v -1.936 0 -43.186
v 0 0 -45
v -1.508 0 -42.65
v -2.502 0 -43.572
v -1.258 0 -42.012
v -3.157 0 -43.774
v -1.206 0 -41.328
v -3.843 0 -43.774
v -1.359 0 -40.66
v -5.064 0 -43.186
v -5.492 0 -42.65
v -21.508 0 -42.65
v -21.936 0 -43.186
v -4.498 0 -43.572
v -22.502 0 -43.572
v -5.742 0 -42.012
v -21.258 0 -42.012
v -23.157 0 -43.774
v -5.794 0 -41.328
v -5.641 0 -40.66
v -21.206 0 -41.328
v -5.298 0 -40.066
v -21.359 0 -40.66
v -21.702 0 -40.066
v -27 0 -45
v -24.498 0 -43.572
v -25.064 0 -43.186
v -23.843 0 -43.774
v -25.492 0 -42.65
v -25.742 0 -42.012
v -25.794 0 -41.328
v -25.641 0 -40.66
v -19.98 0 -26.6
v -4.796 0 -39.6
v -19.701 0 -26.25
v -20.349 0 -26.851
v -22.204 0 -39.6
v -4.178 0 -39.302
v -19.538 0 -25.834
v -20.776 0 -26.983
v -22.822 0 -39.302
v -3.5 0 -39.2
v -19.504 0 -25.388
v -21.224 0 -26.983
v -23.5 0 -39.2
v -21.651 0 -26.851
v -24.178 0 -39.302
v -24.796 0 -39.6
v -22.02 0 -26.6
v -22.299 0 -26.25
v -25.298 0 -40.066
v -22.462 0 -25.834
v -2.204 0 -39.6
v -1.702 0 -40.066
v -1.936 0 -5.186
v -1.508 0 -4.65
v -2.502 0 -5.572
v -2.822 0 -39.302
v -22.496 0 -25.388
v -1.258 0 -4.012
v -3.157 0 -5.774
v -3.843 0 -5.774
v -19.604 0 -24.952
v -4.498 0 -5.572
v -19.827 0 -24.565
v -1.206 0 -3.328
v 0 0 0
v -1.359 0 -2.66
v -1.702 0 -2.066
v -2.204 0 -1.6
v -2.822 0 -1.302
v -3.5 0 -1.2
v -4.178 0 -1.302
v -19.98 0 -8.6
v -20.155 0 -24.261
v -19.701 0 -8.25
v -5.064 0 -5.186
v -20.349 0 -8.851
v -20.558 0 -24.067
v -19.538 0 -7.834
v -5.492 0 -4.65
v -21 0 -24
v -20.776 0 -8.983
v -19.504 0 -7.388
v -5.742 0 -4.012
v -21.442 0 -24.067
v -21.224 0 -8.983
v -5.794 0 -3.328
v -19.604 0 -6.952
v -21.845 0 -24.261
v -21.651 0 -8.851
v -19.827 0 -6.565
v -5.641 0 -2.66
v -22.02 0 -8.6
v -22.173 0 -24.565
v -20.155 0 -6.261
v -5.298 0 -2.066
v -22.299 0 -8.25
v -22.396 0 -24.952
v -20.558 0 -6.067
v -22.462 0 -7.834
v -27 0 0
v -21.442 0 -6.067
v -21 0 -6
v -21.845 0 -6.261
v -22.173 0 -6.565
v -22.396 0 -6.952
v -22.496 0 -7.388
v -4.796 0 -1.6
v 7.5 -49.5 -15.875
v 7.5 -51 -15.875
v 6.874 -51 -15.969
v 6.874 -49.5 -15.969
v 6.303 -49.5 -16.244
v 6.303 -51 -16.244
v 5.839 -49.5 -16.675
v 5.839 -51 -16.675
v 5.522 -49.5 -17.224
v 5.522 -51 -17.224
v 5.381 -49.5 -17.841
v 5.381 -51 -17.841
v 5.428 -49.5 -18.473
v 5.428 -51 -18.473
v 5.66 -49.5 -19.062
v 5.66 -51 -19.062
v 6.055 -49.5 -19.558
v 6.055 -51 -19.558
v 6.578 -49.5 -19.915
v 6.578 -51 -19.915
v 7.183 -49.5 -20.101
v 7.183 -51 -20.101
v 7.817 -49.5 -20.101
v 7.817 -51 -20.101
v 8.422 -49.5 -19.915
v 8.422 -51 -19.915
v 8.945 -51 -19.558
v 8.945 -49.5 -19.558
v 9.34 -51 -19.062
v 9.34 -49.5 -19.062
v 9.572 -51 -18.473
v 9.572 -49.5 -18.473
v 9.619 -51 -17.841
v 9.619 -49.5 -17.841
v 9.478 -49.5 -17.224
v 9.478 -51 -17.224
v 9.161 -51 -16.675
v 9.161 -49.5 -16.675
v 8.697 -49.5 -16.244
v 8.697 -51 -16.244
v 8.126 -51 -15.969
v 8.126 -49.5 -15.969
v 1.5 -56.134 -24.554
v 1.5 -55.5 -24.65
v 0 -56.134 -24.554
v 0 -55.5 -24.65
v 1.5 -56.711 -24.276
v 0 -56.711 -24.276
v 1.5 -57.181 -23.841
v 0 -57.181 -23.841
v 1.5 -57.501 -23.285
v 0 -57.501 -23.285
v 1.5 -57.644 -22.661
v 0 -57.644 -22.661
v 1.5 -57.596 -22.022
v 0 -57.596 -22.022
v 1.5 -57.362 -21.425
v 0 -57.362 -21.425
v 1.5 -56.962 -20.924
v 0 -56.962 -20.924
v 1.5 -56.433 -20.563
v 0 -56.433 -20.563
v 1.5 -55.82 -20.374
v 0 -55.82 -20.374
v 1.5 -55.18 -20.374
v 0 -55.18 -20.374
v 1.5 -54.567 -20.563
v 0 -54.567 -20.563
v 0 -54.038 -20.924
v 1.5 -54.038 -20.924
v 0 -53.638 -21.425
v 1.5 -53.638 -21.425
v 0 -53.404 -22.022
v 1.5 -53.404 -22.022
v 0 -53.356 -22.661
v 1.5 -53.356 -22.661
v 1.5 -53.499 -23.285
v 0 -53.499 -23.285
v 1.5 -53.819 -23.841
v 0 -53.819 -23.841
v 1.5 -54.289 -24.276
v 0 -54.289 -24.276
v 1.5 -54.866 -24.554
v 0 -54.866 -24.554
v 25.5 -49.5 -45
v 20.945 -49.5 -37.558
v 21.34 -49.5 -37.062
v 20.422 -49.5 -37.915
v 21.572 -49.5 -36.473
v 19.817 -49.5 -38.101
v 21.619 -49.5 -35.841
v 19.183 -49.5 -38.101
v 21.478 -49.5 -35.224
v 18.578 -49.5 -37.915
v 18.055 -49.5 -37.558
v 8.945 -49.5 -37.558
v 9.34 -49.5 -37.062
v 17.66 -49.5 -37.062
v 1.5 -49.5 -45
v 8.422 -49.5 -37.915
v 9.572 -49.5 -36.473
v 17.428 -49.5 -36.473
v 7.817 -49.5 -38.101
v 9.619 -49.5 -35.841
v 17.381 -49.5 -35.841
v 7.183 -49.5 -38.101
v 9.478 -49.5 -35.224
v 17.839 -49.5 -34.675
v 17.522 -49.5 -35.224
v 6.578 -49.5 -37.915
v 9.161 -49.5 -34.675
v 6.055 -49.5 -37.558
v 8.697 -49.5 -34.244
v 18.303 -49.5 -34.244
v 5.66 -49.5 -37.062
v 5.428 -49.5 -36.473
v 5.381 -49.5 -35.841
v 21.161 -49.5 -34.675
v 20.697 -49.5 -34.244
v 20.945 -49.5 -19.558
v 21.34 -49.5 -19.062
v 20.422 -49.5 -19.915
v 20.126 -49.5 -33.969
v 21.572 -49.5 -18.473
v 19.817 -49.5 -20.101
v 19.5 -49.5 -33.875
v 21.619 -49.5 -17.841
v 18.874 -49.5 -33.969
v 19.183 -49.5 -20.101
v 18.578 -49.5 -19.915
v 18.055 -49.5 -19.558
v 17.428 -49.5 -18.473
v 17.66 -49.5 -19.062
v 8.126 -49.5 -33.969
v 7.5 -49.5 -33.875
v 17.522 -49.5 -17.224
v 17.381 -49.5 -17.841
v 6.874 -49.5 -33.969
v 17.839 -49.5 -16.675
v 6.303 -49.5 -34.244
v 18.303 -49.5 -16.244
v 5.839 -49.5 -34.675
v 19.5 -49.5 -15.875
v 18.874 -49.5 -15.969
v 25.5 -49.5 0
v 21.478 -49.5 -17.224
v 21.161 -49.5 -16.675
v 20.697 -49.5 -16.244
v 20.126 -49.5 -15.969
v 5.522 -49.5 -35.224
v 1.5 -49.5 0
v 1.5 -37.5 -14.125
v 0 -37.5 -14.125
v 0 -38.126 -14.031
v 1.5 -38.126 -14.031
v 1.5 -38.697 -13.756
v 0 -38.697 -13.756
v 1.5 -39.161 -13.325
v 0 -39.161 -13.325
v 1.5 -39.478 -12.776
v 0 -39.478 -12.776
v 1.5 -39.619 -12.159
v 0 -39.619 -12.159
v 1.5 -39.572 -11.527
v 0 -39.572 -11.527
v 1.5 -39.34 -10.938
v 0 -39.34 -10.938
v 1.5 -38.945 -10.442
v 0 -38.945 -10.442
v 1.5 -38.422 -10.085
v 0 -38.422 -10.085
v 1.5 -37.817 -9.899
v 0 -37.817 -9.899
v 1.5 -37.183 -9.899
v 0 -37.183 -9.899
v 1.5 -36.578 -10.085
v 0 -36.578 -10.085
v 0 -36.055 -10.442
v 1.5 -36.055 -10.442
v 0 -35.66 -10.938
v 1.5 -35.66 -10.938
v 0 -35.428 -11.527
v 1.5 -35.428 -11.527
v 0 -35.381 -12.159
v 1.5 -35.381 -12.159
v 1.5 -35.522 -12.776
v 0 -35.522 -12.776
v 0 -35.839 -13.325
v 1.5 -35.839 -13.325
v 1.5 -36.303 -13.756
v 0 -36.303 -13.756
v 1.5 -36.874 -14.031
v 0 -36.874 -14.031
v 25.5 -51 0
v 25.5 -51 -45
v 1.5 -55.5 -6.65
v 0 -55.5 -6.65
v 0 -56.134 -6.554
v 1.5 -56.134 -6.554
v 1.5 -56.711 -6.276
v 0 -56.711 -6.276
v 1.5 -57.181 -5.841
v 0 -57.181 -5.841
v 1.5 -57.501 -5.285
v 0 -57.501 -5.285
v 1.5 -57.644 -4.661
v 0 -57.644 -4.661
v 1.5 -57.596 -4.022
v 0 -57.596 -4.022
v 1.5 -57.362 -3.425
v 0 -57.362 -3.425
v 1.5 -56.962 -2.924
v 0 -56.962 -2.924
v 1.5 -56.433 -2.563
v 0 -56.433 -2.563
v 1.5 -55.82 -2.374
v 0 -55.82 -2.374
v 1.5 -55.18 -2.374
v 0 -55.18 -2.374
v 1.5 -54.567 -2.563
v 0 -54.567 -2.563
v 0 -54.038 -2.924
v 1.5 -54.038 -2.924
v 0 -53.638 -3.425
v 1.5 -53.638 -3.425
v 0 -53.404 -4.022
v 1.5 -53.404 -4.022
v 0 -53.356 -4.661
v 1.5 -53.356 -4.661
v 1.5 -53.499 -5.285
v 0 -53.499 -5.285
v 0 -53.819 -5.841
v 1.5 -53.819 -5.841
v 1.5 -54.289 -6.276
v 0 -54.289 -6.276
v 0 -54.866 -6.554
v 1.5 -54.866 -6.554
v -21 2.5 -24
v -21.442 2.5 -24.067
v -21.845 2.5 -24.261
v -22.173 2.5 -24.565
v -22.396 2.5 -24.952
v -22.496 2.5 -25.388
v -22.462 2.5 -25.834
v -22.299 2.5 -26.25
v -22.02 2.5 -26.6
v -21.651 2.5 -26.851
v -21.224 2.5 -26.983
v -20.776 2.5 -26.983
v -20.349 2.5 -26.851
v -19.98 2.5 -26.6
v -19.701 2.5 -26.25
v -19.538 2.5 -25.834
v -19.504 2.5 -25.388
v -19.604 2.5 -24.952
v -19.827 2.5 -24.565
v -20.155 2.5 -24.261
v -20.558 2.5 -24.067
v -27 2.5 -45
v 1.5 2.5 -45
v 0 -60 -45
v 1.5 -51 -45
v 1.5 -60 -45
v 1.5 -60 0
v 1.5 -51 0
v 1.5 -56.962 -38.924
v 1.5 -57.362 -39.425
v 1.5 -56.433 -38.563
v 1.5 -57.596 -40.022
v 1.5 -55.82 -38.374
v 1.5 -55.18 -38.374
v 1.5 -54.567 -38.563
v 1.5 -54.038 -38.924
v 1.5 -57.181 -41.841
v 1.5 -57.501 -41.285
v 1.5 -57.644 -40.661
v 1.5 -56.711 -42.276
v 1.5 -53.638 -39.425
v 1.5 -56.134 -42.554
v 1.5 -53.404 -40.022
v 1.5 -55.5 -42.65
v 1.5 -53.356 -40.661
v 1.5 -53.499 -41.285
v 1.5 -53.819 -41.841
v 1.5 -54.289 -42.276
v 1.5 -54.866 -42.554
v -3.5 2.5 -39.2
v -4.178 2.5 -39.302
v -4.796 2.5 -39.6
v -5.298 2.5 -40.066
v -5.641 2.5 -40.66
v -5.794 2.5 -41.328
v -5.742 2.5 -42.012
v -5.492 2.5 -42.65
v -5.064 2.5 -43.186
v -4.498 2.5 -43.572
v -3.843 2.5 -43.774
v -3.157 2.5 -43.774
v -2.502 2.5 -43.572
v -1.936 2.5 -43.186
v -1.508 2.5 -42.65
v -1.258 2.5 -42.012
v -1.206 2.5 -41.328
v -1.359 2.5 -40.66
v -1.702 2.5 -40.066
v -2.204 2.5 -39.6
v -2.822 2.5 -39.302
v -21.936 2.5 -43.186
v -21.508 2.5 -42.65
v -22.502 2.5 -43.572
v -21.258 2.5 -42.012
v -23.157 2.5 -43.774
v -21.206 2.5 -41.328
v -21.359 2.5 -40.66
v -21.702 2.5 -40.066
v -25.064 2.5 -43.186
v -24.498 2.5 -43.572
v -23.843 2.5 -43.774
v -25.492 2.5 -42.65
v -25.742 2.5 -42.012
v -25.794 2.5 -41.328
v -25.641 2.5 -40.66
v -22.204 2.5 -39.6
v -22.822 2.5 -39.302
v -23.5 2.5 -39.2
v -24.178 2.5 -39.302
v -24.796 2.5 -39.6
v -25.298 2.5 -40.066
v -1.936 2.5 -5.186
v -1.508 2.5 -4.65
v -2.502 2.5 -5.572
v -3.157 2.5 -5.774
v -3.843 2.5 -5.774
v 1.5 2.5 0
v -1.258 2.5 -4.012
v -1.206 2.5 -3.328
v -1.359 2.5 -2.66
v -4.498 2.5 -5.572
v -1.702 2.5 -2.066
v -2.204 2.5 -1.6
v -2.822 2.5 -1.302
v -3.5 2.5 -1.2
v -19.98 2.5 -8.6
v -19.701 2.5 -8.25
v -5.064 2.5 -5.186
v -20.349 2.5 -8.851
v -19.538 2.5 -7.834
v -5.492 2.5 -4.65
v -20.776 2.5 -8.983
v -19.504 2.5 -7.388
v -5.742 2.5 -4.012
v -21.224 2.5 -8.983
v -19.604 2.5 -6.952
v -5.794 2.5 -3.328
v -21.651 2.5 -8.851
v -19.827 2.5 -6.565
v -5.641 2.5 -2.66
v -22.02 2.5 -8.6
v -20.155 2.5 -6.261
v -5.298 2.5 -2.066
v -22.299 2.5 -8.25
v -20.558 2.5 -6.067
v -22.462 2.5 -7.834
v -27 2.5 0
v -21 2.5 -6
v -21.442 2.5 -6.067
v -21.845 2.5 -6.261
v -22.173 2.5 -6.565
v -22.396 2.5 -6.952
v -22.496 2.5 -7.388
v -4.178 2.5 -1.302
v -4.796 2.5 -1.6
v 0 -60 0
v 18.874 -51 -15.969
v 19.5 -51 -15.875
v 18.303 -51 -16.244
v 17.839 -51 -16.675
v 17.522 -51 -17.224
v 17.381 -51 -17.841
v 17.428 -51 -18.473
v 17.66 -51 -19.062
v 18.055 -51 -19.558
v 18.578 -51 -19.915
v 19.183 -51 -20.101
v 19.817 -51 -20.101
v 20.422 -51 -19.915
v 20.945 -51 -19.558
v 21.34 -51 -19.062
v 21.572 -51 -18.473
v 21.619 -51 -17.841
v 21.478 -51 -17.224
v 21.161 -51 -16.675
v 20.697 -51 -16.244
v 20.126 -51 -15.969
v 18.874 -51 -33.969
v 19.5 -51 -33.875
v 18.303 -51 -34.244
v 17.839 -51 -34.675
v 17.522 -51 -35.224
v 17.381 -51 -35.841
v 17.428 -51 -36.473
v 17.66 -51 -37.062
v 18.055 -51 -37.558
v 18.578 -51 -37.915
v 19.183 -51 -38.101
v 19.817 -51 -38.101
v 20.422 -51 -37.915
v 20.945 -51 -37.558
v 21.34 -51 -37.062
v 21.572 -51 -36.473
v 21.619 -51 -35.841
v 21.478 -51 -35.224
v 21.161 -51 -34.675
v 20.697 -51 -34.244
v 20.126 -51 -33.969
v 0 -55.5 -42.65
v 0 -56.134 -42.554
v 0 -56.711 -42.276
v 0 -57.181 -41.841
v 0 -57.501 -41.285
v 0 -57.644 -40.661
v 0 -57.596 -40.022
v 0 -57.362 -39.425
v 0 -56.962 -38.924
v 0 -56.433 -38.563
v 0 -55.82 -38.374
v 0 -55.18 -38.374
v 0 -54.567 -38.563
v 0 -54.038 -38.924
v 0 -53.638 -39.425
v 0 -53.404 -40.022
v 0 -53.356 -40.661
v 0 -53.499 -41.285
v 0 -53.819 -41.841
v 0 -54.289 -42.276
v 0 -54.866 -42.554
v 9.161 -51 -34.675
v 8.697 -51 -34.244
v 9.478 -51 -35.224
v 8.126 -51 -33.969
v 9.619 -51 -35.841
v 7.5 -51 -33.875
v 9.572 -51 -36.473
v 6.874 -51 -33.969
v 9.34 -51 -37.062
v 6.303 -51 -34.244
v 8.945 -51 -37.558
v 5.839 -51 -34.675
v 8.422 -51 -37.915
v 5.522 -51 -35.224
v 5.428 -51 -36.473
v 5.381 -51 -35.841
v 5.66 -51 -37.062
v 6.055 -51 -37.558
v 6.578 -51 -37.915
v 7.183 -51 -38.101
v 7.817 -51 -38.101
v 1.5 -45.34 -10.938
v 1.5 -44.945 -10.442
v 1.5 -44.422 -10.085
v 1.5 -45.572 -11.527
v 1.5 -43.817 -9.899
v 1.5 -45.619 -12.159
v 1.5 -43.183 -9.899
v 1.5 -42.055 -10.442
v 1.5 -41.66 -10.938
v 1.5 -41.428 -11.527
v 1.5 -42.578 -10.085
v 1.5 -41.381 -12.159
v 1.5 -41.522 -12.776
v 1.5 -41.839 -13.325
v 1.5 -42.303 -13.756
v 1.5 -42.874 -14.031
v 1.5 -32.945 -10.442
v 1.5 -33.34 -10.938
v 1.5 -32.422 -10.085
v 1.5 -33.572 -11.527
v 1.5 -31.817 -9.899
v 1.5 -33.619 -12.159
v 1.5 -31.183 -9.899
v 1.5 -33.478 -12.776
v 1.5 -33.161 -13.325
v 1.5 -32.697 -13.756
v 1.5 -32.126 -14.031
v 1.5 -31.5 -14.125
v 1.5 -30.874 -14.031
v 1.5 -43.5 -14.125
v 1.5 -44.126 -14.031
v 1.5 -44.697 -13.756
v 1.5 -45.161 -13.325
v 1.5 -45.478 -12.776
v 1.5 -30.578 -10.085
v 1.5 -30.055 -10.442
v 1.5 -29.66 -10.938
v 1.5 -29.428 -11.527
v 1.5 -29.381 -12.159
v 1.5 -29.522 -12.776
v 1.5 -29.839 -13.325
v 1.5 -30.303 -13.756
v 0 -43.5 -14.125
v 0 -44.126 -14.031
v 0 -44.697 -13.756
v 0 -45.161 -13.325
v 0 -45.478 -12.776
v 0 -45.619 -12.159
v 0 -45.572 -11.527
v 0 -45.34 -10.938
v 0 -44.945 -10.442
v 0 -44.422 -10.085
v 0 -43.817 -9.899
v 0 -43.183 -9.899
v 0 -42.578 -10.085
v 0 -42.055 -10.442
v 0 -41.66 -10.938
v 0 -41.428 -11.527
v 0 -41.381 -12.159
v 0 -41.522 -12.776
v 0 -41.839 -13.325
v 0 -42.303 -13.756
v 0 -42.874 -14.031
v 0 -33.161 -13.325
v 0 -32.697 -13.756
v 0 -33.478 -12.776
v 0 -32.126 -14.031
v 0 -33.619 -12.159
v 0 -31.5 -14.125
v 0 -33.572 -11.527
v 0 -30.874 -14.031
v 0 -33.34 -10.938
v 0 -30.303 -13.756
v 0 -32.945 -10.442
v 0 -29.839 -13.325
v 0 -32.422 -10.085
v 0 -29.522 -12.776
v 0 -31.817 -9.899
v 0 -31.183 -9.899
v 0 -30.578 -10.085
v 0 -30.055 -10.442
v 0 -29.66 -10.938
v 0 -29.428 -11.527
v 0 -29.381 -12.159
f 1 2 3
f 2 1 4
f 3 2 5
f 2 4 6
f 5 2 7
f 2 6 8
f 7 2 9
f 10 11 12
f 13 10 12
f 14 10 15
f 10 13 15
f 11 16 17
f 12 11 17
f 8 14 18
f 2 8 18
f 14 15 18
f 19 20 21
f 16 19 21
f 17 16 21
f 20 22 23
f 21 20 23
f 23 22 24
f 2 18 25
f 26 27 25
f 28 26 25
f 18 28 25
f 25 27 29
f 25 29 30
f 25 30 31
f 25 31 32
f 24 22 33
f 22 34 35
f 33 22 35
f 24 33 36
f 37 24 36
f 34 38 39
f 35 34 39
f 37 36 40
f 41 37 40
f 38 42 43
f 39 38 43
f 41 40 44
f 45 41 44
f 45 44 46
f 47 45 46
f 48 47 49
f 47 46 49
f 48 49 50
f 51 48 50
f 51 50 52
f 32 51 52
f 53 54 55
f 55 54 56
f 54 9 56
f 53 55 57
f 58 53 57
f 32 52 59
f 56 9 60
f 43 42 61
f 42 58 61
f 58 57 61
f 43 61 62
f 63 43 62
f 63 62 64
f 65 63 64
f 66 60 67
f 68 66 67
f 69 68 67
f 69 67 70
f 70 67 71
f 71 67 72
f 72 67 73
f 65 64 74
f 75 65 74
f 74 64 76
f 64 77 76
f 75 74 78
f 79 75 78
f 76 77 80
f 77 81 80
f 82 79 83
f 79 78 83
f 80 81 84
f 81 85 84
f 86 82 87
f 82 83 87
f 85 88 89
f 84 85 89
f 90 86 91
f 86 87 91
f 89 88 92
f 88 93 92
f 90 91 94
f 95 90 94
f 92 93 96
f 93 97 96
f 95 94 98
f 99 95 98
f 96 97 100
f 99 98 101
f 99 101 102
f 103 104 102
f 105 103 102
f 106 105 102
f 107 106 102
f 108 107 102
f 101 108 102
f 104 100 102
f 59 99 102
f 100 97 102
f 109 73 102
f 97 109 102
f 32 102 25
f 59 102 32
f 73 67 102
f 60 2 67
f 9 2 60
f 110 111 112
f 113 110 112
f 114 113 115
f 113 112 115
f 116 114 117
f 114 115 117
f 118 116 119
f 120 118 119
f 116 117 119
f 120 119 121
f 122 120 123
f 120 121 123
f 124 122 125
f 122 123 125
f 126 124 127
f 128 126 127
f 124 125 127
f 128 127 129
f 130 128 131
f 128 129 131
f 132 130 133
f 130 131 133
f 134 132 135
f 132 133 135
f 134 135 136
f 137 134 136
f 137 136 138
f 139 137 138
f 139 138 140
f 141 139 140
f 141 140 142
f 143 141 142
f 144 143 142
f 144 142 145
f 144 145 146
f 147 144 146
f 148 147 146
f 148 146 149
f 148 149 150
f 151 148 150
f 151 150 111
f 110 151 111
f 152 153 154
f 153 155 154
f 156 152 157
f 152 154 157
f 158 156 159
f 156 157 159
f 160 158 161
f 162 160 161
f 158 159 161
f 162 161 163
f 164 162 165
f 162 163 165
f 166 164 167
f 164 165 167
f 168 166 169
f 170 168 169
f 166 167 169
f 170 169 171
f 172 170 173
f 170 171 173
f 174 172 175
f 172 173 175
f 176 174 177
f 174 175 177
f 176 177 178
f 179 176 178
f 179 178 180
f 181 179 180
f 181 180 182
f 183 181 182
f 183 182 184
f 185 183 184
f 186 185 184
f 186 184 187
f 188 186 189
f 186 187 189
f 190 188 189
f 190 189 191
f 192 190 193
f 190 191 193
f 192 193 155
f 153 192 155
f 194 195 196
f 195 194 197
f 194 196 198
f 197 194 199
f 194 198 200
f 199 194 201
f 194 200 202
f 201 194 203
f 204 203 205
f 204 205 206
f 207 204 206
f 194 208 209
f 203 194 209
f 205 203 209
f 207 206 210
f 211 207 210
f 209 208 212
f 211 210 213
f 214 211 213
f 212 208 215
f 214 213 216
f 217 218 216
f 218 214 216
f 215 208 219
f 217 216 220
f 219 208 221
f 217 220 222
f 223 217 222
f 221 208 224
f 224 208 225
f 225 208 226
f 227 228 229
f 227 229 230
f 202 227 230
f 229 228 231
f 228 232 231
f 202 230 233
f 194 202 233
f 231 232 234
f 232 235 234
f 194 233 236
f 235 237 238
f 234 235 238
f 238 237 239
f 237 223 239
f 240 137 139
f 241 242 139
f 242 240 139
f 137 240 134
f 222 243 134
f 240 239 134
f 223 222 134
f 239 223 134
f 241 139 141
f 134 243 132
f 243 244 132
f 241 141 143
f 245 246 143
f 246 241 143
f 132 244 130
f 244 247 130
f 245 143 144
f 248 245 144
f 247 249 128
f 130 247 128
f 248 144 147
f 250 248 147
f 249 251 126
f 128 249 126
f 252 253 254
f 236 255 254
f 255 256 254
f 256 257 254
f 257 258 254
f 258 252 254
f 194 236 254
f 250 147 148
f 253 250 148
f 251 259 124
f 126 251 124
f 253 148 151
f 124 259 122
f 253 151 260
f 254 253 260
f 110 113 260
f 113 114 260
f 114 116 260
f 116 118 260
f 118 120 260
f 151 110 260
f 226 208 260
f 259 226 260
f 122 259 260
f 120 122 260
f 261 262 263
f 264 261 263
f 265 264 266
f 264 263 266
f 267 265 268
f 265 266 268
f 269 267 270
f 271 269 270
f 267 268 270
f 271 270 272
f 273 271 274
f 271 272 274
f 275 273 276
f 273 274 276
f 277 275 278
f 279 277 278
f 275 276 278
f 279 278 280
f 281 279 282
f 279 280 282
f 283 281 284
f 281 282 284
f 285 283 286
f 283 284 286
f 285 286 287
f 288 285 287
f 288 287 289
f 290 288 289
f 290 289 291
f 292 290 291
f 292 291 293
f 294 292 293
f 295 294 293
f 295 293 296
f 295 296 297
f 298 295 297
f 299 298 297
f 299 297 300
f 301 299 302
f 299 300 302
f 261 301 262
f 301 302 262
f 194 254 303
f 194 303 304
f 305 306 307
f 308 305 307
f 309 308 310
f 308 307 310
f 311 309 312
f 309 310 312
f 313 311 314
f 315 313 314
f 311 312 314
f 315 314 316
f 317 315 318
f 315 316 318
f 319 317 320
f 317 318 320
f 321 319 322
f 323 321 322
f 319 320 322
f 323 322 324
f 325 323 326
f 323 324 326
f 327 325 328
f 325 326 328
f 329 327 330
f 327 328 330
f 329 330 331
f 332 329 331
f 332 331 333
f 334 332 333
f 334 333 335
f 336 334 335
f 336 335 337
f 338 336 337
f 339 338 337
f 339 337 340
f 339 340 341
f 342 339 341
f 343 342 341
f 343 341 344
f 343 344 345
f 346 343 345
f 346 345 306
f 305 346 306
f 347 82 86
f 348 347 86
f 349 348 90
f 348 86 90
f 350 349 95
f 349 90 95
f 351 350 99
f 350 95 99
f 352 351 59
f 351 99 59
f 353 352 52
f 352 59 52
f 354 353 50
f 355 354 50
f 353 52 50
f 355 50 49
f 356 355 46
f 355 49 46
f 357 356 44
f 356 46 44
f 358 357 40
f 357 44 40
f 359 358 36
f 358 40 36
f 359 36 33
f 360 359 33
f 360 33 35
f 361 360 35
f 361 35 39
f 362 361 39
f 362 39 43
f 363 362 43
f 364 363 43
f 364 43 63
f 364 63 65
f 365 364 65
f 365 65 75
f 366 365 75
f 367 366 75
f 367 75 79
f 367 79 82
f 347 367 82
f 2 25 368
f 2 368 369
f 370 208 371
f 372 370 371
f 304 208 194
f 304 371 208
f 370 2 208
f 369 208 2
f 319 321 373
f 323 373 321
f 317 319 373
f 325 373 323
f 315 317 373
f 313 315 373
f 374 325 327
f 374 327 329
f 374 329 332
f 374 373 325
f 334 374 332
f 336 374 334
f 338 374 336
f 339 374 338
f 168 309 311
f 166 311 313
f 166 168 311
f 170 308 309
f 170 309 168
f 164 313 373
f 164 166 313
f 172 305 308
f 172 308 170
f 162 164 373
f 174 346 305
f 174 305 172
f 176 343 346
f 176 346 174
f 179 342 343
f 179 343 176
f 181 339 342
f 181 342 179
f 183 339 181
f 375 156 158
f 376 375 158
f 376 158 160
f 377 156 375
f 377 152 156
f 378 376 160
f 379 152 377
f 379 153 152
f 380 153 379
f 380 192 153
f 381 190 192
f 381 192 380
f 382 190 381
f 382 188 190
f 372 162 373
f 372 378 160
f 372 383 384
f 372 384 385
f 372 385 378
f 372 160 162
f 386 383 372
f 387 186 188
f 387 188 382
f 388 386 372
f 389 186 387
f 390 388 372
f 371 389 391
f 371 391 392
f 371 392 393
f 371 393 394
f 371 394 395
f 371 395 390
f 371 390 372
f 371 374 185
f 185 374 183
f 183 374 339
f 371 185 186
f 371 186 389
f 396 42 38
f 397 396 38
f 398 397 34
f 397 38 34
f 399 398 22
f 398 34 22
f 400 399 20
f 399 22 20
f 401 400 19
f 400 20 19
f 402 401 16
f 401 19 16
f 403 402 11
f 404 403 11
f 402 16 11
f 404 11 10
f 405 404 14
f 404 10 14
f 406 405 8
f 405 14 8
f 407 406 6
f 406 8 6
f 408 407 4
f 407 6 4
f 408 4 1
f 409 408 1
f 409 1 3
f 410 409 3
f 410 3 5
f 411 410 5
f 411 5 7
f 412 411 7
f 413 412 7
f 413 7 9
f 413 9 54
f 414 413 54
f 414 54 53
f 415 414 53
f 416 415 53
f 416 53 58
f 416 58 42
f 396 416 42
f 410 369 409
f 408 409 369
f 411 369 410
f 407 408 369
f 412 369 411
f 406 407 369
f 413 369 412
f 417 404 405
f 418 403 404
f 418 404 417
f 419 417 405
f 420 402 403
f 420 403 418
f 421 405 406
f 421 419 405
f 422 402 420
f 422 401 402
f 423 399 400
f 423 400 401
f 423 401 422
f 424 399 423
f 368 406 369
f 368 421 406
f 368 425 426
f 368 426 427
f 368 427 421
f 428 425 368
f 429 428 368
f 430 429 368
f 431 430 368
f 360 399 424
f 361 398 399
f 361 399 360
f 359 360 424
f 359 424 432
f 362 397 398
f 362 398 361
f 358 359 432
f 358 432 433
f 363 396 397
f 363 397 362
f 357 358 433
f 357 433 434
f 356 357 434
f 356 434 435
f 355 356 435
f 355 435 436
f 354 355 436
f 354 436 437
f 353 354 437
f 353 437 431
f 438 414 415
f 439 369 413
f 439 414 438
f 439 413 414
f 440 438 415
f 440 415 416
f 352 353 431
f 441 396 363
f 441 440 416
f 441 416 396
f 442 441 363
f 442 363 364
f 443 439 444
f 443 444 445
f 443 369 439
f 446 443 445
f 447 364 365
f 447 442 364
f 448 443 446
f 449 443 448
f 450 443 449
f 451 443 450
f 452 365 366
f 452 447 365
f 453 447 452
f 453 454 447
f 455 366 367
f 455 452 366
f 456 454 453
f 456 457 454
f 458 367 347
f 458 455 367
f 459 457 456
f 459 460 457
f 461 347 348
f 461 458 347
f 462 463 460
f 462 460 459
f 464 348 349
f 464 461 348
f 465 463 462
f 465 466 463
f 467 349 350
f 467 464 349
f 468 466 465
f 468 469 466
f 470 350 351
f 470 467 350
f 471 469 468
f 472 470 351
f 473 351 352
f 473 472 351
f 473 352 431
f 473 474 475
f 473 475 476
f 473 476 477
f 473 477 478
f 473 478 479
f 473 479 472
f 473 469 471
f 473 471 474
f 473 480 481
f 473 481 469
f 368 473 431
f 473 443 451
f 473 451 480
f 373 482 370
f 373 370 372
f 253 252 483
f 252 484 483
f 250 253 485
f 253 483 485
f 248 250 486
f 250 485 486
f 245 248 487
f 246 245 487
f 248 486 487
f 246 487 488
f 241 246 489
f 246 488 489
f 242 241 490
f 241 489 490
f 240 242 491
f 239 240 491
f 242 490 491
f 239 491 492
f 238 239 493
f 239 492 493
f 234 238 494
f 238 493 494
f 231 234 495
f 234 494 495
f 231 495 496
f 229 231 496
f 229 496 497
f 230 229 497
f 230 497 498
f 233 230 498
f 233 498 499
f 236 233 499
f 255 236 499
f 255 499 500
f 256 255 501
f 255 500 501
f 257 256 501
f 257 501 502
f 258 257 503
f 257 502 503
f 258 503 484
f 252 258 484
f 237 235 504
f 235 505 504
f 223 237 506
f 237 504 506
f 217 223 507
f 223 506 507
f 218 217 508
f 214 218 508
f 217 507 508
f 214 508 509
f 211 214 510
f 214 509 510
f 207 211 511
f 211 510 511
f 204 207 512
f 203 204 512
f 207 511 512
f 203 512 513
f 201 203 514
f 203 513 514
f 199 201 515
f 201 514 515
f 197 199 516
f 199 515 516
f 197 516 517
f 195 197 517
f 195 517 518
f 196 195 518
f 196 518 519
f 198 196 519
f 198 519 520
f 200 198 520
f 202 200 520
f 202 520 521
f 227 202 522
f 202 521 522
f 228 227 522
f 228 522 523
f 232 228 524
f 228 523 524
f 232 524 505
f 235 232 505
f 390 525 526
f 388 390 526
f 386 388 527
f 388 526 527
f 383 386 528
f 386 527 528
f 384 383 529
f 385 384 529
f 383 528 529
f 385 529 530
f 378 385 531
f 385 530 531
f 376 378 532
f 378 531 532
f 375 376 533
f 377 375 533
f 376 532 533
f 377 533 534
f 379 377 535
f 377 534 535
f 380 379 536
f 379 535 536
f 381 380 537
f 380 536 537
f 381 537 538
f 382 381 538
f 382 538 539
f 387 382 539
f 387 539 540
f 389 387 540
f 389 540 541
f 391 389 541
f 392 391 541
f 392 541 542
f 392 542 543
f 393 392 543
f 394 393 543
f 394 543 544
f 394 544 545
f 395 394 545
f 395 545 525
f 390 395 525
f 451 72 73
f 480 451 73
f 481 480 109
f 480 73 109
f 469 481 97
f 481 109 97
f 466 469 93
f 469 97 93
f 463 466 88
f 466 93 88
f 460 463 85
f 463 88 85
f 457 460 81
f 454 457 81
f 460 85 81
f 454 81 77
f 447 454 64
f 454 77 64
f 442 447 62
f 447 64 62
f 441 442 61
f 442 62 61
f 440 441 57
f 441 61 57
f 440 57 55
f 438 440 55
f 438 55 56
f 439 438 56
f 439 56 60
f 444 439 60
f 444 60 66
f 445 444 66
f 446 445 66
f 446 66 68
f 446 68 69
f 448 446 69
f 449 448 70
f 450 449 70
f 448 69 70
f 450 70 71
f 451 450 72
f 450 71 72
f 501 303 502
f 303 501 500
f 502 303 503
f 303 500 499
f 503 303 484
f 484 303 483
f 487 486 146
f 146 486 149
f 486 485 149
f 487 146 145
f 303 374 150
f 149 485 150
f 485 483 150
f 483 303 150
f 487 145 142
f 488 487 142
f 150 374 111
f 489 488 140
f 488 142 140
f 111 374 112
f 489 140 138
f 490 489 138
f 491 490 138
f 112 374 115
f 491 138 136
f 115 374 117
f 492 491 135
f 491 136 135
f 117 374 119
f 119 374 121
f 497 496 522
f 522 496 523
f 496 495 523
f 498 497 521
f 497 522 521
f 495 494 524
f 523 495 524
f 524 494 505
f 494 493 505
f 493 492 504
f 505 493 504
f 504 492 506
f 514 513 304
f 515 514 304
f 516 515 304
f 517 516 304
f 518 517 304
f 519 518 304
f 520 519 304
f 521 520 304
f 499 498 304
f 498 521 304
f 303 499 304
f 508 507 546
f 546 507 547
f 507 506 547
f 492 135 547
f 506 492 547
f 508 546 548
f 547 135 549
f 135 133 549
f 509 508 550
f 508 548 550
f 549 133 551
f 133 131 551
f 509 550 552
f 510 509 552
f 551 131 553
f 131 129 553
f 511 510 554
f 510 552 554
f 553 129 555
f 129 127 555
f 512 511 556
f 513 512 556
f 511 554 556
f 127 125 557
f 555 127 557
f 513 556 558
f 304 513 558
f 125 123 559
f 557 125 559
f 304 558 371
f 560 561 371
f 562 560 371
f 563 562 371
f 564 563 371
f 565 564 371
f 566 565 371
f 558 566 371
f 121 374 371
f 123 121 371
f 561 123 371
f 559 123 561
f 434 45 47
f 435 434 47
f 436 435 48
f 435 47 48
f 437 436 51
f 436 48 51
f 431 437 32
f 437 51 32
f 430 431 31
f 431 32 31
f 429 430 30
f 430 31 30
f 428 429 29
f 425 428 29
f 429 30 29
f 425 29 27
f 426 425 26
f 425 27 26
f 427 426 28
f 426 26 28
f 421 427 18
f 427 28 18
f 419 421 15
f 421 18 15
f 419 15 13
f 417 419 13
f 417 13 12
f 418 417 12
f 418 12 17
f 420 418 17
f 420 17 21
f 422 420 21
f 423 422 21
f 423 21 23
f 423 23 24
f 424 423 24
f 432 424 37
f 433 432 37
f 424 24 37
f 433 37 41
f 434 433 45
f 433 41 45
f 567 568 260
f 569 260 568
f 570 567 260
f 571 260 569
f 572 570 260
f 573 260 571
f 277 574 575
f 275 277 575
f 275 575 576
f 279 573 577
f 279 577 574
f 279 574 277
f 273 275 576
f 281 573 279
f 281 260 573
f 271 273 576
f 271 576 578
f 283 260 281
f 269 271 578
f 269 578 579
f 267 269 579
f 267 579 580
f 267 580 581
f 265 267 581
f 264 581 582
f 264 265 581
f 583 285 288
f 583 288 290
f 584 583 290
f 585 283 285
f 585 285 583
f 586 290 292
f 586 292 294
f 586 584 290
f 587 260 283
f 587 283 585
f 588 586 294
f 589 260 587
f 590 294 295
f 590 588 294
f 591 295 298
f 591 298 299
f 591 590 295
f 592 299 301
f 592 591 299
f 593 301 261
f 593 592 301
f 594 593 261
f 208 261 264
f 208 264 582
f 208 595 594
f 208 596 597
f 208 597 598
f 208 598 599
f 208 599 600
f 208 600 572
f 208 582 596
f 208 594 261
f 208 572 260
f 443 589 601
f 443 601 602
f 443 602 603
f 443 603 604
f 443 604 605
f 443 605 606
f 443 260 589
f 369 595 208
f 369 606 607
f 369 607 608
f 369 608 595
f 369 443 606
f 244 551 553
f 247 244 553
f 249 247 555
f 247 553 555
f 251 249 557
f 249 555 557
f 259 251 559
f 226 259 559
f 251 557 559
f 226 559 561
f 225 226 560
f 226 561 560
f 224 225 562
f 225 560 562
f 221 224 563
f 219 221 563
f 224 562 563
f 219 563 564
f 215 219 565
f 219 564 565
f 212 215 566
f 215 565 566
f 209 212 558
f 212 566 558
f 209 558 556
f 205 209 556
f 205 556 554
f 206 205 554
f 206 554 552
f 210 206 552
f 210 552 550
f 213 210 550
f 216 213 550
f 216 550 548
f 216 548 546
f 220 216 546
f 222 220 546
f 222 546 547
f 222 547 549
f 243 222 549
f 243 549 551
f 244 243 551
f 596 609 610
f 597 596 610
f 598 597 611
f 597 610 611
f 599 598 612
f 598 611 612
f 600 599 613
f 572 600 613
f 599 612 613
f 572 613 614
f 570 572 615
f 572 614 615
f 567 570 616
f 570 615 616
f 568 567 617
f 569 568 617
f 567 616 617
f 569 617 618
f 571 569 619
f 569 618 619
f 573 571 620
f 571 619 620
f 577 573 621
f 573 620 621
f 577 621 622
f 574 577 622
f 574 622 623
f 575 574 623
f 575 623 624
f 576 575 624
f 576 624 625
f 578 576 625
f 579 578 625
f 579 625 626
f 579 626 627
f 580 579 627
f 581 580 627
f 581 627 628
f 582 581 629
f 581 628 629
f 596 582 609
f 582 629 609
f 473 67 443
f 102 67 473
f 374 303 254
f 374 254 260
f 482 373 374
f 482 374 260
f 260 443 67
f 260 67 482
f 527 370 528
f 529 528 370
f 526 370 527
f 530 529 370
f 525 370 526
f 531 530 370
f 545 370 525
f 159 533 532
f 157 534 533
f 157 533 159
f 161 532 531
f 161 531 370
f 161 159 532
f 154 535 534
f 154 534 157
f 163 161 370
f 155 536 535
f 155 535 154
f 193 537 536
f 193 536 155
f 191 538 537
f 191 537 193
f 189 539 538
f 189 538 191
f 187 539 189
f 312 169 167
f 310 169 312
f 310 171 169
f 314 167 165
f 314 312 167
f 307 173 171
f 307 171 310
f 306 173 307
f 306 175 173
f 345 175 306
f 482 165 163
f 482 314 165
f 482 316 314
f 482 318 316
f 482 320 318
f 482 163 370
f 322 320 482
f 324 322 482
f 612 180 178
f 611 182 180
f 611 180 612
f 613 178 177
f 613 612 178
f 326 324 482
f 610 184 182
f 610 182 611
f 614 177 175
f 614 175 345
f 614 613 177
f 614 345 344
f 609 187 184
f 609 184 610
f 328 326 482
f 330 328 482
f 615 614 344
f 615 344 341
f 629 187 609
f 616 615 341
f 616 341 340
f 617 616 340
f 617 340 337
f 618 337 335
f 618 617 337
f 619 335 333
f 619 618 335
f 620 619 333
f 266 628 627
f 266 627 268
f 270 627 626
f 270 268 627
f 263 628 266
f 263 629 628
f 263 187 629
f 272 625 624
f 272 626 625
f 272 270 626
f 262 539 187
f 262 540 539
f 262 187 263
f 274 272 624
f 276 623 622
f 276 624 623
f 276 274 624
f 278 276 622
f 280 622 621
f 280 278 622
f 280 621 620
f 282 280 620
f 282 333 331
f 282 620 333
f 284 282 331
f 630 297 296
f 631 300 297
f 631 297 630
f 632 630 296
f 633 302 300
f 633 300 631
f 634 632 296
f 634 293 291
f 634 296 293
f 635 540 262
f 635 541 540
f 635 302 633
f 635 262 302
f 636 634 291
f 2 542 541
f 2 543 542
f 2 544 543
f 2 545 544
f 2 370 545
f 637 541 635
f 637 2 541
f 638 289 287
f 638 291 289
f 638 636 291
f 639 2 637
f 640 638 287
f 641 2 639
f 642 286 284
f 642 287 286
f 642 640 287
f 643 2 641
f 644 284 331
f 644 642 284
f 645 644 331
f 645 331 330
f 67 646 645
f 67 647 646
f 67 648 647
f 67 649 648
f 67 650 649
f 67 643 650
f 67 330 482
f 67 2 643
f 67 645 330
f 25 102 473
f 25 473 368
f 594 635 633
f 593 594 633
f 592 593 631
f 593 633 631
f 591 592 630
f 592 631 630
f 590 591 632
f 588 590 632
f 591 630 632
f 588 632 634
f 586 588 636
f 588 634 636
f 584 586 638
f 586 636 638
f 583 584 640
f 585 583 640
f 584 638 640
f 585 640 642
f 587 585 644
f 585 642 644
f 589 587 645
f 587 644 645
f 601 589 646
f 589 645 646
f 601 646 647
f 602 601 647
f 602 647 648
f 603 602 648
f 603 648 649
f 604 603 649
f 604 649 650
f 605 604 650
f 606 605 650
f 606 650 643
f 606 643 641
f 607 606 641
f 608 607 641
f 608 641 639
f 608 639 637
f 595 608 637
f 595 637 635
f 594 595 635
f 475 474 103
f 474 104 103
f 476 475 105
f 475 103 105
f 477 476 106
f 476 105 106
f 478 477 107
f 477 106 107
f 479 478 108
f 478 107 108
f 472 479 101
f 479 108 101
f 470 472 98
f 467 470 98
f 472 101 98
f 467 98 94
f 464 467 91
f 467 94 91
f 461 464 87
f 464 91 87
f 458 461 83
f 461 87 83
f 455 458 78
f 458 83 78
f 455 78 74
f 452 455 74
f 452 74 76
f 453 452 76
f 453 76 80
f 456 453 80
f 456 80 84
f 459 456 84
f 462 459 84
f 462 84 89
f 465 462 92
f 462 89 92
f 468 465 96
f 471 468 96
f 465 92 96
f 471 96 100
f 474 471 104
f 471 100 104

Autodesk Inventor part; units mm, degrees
ref_plane "YZ Plane" through (0, 0, 0) normal (1, 0, 0) x (0, 1, 0)
ref_plane "XZ Plane" through (0, 0, 0) normal (0, 1, 0) x (-1, 0, 0)
ref_plane "XY Plane" through (0, 0, 0) normal (0, 0, 1) x (1, 0, 0)
sketch "Sketch3" plane through (0, 0, 0) normal (0, 1, 0) x (-1, 0, 0)
  line L0 (0, 0) -> (27, 0)
  line L1 (27, 0) -> (27, -45)
  line L2 (27, -45) -> (0, -45)
  line L3 (0, -45) -> (0, 0)
  dimension "d27" = 27
  dimension "d28" = 45
extrude "Extrusion2" add sketch "Sketch3" along normal blind 2.5
sketch "Sketch4" plane through (0, 0, 0) normal (0, -1, 0) x (1, 0, 0)
  line L0 (0, 0) -> (1.5, 0)
  line L1 (1.5, 0) -> (1.5, -45)
  line L2 (1.5, -45) -> (0, -45)
  line L3 (0, -45) -> (0, 0)
  dimension "d31" = 1.5
  dimension "d32" = 45
extrude "Extrusion3" add sketch "Sketch4" along normal blind 60 and the other way blind 2.5
sketch "Sketch5" plane through (0, 2.5, 0) normal (0, 1, 0) x (1, 0, 0)
  line L0 (-27, 0) -> (-27, 45) projected
  line L1 (-27, 0) -> (1.5, 0) projected
  circle A0 centre (-3.5, 3.5) radius 2.3
  line L2 (0, 45) -> (0, 0) projected
  circle A1 centre (-23.5, 41.5) radius 2.3
  line L3 (1.5, 45) -> (-27, 45) projected
  circle A2 centre (-3.5, 41.5) radius 2.3
  dimension "d45" = 4.6
  dimension "d46" = 3.5
  dimension "d47" = 3.5
  dimension "d50" = 4.6
  dimension "d51" = 3.5
  dimension "d52" = 4.6
  dimension "d61" = 3.5
  dimension "d62" = 3.5
  dimension "d63" = 3.5
hole "Hole2" at (-3.5, 2.5, -3.5) at (-3.5, 2.5, -41.5) at (-23.5, 2.5, -41.5) direction (0, -1, 0) diameter 4.6 end through all
sketch "Sketch6" plane through (0, 2.5, 0) normal (0, 1, 0) x (1, 0, 0)
  circle A0 centre (-21, 7.5) radius 1.5
  line L0 (-27, 45) -> (-27, 0) projected
  line L1 (-27, 0) -> (1.5, 0) projected
  circle A1 centre (-21, 25.5) radius 1.5
  point P0 (0, 0)
  dimension "d64" = 3
  dimension "d65" = 6
  dimension "d66" = 7.5
  dimension "d67" = 3
  dimension "d68" = 18
hole "Hole3" at (-21, 2.5, -7.5) at (-21, 2.5, -25.5) direction (0, -1, 0) diameter 3 end through all
sketch "Sketch7" plane through (1.5, -60, 0) normal (1, 0, 0) x (0, 0, -1)
  circle A0 centre (4.5, 4.5) radius 2.15
  line L0 (45, 0) -> (0, 0) projected
  line L1 (0, 0) -> (0, 62.5) projected
  circle A1 centre (40.5, 4.5) radius 2.15
  line L2 (45, 0) -> (45, 62.5) projected
  circle A2 centre (22.5, 4.5) radius 2.15
  point P0 (0, 60)
  dimension "d76" = 4.3
  dimension "d77" = 4.5
  dimension "d78" = 4.5
  dimension "d79" = 4.3
  dimension "d80" = 4.5
  dimension "d81" = 4.5
  dimension "d82" = 4.3
hole "Hole4" at (1.5, -55.5, -4.5) at (1.5, -55.5, -22.5) at (1.5, -55.5, -40.5) direction (-1, 0, 0) diameter 4.3 end through all
sketch "Sketch8" plane through (1.5, -60, 0) normal (1, 0, 0) x (0, 0, -1)
  line L0 (0, 9) -> (45, 9)
  line L1 (45, 9) -> (45, 10.5)
  line L2 (45, 10.5) -> (0, 10.5)
  line L3 (0, 10.5) -> (0, 9)
  line L4 (0, 62.5) -> (45, 62.5) projected
  point P0 (0, 60)
  dimension "d90" = 45
  dimension "d91" = 1.5
  dimension "d92" = 52
extrude "Extrusion4" add sketch "Sketch8" along normal blind 24
sketch "Sketch10" plane through (1.5, -49.5, 0) normal (0, 1, 0) x (1, 0, 0)
  circle A0 centre (6, 36) radius 2.125
  line L0 (0, 45) -> (24, 45) projected
  line L1 (0, 0) -> (0, 45) projected
  circle A1 centre (18, 36) radius 2.125
  line L2 (6, 36) -> (6, 27)
  line L3 (6, 27) -> (12, 27)
  circle A2 centre (6, 18) radius 2.125
  circle A3 centre (18, 18) radius 2.125
  point P0 (-1.5, 0)
  dimension "d95" = 4.25
  dimension "d96" = 9
  dimension "d97" = 6
  dimension "d100" = 4.25
  dimension "d102" = 9
hole "Hole6" at (7.5, -49.5, -18) at (7.5, -49.5, -36) at (19.5, -49.5, -36) at (19.5, -49.5, -18) direction (0, -1, 0) diameter 4.25 end through all
sketch "Sketch11" plane through (1.5, 2.5, 0) normal (1, 0, 0) x (0, 0, -1)
  circle A0 centre (12, -46) radius 2.125
  line L0 (45, -52) -> (45, 0) projected
  line L1 (0, -52) -> (0, 0) projected
  line L2 (0, -52) -> (45, -52) projected
  circle A1 centre (12, -40) radius 2.125
  circle A2 centre (12, -34) radius 2.125
  point P0 (0, -2.5)
  dimension "d117" = 4.25
  dimension "d119" = 12
  dimension "d120" = 6
  dimension "d121" = 4.25
  dimension "d122" = 6
  dimension "d123" = 4.25
  dimension "d124" = 6
hole "Hole7" at (1.5, -31.5, -12) at (1.5, -37.5, -12) at (1.5, -43.5, -12) direction (-1, 0, 0) diameter 4.25 depth 8 tip angle 118
properties part number "TrolleyRightPlate"
